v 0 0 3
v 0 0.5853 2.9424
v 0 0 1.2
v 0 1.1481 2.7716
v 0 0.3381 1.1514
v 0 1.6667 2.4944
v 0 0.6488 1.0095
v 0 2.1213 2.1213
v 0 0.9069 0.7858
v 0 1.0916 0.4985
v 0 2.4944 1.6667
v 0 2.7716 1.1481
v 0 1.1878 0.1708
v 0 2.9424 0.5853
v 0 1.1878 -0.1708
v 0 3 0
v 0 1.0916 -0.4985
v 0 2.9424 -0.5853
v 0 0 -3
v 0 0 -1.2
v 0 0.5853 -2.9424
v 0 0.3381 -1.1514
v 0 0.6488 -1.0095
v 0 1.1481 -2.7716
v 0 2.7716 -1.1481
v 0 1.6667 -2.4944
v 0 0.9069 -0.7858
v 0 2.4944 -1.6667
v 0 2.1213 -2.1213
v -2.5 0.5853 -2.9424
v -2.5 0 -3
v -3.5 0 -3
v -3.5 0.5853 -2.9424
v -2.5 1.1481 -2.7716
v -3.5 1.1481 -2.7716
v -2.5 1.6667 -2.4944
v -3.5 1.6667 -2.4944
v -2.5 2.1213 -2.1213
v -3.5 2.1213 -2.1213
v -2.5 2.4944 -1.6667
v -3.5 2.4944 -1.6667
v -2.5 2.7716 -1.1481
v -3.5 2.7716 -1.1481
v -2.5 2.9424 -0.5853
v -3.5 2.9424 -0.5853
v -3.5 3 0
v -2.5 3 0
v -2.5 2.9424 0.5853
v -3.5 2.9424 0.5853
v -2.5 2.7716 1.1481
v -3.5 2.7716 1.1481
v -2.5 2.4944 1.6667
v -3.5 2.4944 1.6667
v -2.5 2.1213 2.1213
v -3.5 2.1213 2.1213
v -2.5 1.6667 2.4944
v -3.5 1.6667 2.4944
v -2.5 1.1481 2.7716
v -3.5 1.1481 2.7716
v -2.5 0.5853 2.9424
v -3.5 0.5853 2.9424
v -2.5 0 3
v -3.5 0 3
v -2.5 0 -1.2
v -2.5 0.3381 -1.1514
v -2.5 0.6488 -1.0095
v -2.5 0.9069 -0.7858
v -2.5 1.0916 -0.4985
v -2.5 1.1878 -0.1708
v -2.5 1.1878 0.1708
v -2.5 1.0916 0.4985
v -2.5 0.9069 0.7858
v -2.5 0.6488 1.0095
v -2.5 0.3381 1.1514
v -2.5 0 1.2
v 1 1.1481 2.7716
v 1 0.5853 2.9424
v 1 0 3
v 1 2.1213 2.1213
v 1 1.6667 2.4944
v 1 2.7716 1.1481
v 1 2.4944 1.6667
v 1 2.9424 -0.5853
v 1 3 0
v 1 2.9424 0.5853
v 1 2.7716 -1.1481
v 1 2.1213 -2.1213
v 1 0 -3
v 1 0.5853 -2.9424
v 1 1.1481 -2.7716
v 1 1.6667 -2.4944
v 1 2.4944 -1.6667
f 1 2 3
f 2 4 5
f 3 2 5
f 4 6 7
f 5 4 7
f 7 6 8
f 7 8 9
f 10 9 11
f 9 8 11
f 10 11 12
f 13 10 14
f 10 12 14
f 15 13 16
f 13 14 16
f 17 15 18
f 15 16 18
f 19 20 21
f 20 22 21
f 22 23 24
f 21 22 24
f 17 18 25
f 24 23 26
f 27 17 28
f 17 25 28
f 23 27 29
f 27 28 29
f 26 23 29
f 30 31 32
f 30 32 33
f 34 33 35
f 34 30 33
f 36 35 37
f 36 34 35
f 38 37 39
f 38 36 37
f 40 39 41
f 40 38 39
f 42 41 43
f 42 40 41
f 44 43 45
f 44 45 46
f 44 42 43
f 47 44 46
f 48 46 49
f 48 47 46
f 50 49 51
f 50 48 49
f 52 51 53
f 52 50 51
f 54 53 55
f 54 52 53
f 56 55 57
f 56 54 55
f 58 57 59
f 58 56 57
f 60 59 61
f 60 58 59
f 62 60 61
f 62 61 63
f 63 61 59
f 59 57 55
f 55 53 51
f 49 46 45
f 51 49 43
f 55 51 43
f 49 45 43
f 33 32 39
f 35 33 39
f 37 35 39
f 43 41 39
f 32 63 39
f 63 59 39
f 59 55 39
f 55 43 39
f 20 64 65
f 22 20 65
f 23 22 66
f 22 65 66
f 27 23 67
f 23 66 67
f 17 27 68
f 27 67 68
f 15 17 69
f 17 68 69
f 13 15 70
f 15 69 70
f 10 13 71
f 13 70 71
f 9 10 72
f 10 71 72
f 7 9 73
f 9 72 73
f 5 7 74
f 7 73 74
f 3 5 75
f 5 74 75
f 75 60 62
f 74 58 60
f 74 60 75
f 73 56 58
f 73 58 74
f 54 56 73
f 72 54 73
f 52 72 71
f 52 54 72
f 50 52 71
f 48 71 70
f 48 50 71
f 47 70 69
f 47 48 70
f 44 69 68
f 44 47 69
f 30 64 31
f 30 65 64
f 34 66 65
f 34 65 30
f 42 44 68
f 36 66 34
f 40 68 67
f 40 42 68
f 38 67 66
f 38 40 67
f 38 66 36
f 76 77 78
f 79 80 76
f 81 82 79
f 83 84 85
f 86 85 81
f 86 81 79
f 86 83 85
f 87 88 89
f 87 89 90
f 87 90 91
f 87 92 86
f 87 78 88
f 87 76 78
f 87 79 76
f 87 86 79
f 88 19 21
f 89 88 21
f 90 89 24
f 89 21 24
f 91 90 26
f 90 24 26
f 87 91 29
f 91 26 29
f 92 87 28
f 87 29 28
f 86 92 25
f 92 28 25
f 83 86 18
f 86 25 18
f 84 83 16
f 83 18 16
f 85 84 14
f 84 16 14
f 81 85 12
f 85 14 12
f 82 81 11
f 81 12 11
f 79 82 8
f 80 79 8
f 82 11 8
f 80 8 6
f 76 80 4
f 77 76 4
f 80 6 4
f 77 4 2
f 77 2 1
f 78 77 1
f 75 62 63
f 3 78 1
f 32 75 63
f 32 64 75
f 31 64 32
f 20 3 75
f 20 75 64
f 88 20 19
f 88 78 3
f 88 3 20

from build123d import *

# Parameters (mm, degrees)
BOSS_EXTRUDE1_DEPTH = 1
BOSS_EXTRUDE2_DEPTH = 1.25


with BuildPart() as part:
    # Sketch1 → Boss-Extrude1 (new body)
    with BuildSketch(Plane(origin=(0, 0, 0), x_dir=(0, 0, -1), z_dir=(1, 0, 0))):
        with BuildLine():
            ThreePointArc((3, 0), (0, 3), (-3, 0))
            Line((-3, 0), (3, 0))
        make_face()
    extrude(amount=BOSS_EXTRUDE1_DEPTH)

    # Sketch1<3> → Boss-Extrude2 (add)
    with BuildSketch(Plane(origin=(0, 0, 0), x_dir=(0, 0, -1), z_dir=(1, 0, 0))):
        with BuildLine():
            ThreePointArc((1.2, 0), (0, 1.2), (-1.2, 0))
            Line((-1.2, 0), (1.2, 0))
        make_face()
    extrude(amount=-BOSS_EXTRUDE2_DEPTH)

    # Mirror1: part across plane


with BuildPart() as part_1:
    add(part.part)
    add(part.part.mirror(Plane.ZY.offset(1.25)))


solid = part_1.part
